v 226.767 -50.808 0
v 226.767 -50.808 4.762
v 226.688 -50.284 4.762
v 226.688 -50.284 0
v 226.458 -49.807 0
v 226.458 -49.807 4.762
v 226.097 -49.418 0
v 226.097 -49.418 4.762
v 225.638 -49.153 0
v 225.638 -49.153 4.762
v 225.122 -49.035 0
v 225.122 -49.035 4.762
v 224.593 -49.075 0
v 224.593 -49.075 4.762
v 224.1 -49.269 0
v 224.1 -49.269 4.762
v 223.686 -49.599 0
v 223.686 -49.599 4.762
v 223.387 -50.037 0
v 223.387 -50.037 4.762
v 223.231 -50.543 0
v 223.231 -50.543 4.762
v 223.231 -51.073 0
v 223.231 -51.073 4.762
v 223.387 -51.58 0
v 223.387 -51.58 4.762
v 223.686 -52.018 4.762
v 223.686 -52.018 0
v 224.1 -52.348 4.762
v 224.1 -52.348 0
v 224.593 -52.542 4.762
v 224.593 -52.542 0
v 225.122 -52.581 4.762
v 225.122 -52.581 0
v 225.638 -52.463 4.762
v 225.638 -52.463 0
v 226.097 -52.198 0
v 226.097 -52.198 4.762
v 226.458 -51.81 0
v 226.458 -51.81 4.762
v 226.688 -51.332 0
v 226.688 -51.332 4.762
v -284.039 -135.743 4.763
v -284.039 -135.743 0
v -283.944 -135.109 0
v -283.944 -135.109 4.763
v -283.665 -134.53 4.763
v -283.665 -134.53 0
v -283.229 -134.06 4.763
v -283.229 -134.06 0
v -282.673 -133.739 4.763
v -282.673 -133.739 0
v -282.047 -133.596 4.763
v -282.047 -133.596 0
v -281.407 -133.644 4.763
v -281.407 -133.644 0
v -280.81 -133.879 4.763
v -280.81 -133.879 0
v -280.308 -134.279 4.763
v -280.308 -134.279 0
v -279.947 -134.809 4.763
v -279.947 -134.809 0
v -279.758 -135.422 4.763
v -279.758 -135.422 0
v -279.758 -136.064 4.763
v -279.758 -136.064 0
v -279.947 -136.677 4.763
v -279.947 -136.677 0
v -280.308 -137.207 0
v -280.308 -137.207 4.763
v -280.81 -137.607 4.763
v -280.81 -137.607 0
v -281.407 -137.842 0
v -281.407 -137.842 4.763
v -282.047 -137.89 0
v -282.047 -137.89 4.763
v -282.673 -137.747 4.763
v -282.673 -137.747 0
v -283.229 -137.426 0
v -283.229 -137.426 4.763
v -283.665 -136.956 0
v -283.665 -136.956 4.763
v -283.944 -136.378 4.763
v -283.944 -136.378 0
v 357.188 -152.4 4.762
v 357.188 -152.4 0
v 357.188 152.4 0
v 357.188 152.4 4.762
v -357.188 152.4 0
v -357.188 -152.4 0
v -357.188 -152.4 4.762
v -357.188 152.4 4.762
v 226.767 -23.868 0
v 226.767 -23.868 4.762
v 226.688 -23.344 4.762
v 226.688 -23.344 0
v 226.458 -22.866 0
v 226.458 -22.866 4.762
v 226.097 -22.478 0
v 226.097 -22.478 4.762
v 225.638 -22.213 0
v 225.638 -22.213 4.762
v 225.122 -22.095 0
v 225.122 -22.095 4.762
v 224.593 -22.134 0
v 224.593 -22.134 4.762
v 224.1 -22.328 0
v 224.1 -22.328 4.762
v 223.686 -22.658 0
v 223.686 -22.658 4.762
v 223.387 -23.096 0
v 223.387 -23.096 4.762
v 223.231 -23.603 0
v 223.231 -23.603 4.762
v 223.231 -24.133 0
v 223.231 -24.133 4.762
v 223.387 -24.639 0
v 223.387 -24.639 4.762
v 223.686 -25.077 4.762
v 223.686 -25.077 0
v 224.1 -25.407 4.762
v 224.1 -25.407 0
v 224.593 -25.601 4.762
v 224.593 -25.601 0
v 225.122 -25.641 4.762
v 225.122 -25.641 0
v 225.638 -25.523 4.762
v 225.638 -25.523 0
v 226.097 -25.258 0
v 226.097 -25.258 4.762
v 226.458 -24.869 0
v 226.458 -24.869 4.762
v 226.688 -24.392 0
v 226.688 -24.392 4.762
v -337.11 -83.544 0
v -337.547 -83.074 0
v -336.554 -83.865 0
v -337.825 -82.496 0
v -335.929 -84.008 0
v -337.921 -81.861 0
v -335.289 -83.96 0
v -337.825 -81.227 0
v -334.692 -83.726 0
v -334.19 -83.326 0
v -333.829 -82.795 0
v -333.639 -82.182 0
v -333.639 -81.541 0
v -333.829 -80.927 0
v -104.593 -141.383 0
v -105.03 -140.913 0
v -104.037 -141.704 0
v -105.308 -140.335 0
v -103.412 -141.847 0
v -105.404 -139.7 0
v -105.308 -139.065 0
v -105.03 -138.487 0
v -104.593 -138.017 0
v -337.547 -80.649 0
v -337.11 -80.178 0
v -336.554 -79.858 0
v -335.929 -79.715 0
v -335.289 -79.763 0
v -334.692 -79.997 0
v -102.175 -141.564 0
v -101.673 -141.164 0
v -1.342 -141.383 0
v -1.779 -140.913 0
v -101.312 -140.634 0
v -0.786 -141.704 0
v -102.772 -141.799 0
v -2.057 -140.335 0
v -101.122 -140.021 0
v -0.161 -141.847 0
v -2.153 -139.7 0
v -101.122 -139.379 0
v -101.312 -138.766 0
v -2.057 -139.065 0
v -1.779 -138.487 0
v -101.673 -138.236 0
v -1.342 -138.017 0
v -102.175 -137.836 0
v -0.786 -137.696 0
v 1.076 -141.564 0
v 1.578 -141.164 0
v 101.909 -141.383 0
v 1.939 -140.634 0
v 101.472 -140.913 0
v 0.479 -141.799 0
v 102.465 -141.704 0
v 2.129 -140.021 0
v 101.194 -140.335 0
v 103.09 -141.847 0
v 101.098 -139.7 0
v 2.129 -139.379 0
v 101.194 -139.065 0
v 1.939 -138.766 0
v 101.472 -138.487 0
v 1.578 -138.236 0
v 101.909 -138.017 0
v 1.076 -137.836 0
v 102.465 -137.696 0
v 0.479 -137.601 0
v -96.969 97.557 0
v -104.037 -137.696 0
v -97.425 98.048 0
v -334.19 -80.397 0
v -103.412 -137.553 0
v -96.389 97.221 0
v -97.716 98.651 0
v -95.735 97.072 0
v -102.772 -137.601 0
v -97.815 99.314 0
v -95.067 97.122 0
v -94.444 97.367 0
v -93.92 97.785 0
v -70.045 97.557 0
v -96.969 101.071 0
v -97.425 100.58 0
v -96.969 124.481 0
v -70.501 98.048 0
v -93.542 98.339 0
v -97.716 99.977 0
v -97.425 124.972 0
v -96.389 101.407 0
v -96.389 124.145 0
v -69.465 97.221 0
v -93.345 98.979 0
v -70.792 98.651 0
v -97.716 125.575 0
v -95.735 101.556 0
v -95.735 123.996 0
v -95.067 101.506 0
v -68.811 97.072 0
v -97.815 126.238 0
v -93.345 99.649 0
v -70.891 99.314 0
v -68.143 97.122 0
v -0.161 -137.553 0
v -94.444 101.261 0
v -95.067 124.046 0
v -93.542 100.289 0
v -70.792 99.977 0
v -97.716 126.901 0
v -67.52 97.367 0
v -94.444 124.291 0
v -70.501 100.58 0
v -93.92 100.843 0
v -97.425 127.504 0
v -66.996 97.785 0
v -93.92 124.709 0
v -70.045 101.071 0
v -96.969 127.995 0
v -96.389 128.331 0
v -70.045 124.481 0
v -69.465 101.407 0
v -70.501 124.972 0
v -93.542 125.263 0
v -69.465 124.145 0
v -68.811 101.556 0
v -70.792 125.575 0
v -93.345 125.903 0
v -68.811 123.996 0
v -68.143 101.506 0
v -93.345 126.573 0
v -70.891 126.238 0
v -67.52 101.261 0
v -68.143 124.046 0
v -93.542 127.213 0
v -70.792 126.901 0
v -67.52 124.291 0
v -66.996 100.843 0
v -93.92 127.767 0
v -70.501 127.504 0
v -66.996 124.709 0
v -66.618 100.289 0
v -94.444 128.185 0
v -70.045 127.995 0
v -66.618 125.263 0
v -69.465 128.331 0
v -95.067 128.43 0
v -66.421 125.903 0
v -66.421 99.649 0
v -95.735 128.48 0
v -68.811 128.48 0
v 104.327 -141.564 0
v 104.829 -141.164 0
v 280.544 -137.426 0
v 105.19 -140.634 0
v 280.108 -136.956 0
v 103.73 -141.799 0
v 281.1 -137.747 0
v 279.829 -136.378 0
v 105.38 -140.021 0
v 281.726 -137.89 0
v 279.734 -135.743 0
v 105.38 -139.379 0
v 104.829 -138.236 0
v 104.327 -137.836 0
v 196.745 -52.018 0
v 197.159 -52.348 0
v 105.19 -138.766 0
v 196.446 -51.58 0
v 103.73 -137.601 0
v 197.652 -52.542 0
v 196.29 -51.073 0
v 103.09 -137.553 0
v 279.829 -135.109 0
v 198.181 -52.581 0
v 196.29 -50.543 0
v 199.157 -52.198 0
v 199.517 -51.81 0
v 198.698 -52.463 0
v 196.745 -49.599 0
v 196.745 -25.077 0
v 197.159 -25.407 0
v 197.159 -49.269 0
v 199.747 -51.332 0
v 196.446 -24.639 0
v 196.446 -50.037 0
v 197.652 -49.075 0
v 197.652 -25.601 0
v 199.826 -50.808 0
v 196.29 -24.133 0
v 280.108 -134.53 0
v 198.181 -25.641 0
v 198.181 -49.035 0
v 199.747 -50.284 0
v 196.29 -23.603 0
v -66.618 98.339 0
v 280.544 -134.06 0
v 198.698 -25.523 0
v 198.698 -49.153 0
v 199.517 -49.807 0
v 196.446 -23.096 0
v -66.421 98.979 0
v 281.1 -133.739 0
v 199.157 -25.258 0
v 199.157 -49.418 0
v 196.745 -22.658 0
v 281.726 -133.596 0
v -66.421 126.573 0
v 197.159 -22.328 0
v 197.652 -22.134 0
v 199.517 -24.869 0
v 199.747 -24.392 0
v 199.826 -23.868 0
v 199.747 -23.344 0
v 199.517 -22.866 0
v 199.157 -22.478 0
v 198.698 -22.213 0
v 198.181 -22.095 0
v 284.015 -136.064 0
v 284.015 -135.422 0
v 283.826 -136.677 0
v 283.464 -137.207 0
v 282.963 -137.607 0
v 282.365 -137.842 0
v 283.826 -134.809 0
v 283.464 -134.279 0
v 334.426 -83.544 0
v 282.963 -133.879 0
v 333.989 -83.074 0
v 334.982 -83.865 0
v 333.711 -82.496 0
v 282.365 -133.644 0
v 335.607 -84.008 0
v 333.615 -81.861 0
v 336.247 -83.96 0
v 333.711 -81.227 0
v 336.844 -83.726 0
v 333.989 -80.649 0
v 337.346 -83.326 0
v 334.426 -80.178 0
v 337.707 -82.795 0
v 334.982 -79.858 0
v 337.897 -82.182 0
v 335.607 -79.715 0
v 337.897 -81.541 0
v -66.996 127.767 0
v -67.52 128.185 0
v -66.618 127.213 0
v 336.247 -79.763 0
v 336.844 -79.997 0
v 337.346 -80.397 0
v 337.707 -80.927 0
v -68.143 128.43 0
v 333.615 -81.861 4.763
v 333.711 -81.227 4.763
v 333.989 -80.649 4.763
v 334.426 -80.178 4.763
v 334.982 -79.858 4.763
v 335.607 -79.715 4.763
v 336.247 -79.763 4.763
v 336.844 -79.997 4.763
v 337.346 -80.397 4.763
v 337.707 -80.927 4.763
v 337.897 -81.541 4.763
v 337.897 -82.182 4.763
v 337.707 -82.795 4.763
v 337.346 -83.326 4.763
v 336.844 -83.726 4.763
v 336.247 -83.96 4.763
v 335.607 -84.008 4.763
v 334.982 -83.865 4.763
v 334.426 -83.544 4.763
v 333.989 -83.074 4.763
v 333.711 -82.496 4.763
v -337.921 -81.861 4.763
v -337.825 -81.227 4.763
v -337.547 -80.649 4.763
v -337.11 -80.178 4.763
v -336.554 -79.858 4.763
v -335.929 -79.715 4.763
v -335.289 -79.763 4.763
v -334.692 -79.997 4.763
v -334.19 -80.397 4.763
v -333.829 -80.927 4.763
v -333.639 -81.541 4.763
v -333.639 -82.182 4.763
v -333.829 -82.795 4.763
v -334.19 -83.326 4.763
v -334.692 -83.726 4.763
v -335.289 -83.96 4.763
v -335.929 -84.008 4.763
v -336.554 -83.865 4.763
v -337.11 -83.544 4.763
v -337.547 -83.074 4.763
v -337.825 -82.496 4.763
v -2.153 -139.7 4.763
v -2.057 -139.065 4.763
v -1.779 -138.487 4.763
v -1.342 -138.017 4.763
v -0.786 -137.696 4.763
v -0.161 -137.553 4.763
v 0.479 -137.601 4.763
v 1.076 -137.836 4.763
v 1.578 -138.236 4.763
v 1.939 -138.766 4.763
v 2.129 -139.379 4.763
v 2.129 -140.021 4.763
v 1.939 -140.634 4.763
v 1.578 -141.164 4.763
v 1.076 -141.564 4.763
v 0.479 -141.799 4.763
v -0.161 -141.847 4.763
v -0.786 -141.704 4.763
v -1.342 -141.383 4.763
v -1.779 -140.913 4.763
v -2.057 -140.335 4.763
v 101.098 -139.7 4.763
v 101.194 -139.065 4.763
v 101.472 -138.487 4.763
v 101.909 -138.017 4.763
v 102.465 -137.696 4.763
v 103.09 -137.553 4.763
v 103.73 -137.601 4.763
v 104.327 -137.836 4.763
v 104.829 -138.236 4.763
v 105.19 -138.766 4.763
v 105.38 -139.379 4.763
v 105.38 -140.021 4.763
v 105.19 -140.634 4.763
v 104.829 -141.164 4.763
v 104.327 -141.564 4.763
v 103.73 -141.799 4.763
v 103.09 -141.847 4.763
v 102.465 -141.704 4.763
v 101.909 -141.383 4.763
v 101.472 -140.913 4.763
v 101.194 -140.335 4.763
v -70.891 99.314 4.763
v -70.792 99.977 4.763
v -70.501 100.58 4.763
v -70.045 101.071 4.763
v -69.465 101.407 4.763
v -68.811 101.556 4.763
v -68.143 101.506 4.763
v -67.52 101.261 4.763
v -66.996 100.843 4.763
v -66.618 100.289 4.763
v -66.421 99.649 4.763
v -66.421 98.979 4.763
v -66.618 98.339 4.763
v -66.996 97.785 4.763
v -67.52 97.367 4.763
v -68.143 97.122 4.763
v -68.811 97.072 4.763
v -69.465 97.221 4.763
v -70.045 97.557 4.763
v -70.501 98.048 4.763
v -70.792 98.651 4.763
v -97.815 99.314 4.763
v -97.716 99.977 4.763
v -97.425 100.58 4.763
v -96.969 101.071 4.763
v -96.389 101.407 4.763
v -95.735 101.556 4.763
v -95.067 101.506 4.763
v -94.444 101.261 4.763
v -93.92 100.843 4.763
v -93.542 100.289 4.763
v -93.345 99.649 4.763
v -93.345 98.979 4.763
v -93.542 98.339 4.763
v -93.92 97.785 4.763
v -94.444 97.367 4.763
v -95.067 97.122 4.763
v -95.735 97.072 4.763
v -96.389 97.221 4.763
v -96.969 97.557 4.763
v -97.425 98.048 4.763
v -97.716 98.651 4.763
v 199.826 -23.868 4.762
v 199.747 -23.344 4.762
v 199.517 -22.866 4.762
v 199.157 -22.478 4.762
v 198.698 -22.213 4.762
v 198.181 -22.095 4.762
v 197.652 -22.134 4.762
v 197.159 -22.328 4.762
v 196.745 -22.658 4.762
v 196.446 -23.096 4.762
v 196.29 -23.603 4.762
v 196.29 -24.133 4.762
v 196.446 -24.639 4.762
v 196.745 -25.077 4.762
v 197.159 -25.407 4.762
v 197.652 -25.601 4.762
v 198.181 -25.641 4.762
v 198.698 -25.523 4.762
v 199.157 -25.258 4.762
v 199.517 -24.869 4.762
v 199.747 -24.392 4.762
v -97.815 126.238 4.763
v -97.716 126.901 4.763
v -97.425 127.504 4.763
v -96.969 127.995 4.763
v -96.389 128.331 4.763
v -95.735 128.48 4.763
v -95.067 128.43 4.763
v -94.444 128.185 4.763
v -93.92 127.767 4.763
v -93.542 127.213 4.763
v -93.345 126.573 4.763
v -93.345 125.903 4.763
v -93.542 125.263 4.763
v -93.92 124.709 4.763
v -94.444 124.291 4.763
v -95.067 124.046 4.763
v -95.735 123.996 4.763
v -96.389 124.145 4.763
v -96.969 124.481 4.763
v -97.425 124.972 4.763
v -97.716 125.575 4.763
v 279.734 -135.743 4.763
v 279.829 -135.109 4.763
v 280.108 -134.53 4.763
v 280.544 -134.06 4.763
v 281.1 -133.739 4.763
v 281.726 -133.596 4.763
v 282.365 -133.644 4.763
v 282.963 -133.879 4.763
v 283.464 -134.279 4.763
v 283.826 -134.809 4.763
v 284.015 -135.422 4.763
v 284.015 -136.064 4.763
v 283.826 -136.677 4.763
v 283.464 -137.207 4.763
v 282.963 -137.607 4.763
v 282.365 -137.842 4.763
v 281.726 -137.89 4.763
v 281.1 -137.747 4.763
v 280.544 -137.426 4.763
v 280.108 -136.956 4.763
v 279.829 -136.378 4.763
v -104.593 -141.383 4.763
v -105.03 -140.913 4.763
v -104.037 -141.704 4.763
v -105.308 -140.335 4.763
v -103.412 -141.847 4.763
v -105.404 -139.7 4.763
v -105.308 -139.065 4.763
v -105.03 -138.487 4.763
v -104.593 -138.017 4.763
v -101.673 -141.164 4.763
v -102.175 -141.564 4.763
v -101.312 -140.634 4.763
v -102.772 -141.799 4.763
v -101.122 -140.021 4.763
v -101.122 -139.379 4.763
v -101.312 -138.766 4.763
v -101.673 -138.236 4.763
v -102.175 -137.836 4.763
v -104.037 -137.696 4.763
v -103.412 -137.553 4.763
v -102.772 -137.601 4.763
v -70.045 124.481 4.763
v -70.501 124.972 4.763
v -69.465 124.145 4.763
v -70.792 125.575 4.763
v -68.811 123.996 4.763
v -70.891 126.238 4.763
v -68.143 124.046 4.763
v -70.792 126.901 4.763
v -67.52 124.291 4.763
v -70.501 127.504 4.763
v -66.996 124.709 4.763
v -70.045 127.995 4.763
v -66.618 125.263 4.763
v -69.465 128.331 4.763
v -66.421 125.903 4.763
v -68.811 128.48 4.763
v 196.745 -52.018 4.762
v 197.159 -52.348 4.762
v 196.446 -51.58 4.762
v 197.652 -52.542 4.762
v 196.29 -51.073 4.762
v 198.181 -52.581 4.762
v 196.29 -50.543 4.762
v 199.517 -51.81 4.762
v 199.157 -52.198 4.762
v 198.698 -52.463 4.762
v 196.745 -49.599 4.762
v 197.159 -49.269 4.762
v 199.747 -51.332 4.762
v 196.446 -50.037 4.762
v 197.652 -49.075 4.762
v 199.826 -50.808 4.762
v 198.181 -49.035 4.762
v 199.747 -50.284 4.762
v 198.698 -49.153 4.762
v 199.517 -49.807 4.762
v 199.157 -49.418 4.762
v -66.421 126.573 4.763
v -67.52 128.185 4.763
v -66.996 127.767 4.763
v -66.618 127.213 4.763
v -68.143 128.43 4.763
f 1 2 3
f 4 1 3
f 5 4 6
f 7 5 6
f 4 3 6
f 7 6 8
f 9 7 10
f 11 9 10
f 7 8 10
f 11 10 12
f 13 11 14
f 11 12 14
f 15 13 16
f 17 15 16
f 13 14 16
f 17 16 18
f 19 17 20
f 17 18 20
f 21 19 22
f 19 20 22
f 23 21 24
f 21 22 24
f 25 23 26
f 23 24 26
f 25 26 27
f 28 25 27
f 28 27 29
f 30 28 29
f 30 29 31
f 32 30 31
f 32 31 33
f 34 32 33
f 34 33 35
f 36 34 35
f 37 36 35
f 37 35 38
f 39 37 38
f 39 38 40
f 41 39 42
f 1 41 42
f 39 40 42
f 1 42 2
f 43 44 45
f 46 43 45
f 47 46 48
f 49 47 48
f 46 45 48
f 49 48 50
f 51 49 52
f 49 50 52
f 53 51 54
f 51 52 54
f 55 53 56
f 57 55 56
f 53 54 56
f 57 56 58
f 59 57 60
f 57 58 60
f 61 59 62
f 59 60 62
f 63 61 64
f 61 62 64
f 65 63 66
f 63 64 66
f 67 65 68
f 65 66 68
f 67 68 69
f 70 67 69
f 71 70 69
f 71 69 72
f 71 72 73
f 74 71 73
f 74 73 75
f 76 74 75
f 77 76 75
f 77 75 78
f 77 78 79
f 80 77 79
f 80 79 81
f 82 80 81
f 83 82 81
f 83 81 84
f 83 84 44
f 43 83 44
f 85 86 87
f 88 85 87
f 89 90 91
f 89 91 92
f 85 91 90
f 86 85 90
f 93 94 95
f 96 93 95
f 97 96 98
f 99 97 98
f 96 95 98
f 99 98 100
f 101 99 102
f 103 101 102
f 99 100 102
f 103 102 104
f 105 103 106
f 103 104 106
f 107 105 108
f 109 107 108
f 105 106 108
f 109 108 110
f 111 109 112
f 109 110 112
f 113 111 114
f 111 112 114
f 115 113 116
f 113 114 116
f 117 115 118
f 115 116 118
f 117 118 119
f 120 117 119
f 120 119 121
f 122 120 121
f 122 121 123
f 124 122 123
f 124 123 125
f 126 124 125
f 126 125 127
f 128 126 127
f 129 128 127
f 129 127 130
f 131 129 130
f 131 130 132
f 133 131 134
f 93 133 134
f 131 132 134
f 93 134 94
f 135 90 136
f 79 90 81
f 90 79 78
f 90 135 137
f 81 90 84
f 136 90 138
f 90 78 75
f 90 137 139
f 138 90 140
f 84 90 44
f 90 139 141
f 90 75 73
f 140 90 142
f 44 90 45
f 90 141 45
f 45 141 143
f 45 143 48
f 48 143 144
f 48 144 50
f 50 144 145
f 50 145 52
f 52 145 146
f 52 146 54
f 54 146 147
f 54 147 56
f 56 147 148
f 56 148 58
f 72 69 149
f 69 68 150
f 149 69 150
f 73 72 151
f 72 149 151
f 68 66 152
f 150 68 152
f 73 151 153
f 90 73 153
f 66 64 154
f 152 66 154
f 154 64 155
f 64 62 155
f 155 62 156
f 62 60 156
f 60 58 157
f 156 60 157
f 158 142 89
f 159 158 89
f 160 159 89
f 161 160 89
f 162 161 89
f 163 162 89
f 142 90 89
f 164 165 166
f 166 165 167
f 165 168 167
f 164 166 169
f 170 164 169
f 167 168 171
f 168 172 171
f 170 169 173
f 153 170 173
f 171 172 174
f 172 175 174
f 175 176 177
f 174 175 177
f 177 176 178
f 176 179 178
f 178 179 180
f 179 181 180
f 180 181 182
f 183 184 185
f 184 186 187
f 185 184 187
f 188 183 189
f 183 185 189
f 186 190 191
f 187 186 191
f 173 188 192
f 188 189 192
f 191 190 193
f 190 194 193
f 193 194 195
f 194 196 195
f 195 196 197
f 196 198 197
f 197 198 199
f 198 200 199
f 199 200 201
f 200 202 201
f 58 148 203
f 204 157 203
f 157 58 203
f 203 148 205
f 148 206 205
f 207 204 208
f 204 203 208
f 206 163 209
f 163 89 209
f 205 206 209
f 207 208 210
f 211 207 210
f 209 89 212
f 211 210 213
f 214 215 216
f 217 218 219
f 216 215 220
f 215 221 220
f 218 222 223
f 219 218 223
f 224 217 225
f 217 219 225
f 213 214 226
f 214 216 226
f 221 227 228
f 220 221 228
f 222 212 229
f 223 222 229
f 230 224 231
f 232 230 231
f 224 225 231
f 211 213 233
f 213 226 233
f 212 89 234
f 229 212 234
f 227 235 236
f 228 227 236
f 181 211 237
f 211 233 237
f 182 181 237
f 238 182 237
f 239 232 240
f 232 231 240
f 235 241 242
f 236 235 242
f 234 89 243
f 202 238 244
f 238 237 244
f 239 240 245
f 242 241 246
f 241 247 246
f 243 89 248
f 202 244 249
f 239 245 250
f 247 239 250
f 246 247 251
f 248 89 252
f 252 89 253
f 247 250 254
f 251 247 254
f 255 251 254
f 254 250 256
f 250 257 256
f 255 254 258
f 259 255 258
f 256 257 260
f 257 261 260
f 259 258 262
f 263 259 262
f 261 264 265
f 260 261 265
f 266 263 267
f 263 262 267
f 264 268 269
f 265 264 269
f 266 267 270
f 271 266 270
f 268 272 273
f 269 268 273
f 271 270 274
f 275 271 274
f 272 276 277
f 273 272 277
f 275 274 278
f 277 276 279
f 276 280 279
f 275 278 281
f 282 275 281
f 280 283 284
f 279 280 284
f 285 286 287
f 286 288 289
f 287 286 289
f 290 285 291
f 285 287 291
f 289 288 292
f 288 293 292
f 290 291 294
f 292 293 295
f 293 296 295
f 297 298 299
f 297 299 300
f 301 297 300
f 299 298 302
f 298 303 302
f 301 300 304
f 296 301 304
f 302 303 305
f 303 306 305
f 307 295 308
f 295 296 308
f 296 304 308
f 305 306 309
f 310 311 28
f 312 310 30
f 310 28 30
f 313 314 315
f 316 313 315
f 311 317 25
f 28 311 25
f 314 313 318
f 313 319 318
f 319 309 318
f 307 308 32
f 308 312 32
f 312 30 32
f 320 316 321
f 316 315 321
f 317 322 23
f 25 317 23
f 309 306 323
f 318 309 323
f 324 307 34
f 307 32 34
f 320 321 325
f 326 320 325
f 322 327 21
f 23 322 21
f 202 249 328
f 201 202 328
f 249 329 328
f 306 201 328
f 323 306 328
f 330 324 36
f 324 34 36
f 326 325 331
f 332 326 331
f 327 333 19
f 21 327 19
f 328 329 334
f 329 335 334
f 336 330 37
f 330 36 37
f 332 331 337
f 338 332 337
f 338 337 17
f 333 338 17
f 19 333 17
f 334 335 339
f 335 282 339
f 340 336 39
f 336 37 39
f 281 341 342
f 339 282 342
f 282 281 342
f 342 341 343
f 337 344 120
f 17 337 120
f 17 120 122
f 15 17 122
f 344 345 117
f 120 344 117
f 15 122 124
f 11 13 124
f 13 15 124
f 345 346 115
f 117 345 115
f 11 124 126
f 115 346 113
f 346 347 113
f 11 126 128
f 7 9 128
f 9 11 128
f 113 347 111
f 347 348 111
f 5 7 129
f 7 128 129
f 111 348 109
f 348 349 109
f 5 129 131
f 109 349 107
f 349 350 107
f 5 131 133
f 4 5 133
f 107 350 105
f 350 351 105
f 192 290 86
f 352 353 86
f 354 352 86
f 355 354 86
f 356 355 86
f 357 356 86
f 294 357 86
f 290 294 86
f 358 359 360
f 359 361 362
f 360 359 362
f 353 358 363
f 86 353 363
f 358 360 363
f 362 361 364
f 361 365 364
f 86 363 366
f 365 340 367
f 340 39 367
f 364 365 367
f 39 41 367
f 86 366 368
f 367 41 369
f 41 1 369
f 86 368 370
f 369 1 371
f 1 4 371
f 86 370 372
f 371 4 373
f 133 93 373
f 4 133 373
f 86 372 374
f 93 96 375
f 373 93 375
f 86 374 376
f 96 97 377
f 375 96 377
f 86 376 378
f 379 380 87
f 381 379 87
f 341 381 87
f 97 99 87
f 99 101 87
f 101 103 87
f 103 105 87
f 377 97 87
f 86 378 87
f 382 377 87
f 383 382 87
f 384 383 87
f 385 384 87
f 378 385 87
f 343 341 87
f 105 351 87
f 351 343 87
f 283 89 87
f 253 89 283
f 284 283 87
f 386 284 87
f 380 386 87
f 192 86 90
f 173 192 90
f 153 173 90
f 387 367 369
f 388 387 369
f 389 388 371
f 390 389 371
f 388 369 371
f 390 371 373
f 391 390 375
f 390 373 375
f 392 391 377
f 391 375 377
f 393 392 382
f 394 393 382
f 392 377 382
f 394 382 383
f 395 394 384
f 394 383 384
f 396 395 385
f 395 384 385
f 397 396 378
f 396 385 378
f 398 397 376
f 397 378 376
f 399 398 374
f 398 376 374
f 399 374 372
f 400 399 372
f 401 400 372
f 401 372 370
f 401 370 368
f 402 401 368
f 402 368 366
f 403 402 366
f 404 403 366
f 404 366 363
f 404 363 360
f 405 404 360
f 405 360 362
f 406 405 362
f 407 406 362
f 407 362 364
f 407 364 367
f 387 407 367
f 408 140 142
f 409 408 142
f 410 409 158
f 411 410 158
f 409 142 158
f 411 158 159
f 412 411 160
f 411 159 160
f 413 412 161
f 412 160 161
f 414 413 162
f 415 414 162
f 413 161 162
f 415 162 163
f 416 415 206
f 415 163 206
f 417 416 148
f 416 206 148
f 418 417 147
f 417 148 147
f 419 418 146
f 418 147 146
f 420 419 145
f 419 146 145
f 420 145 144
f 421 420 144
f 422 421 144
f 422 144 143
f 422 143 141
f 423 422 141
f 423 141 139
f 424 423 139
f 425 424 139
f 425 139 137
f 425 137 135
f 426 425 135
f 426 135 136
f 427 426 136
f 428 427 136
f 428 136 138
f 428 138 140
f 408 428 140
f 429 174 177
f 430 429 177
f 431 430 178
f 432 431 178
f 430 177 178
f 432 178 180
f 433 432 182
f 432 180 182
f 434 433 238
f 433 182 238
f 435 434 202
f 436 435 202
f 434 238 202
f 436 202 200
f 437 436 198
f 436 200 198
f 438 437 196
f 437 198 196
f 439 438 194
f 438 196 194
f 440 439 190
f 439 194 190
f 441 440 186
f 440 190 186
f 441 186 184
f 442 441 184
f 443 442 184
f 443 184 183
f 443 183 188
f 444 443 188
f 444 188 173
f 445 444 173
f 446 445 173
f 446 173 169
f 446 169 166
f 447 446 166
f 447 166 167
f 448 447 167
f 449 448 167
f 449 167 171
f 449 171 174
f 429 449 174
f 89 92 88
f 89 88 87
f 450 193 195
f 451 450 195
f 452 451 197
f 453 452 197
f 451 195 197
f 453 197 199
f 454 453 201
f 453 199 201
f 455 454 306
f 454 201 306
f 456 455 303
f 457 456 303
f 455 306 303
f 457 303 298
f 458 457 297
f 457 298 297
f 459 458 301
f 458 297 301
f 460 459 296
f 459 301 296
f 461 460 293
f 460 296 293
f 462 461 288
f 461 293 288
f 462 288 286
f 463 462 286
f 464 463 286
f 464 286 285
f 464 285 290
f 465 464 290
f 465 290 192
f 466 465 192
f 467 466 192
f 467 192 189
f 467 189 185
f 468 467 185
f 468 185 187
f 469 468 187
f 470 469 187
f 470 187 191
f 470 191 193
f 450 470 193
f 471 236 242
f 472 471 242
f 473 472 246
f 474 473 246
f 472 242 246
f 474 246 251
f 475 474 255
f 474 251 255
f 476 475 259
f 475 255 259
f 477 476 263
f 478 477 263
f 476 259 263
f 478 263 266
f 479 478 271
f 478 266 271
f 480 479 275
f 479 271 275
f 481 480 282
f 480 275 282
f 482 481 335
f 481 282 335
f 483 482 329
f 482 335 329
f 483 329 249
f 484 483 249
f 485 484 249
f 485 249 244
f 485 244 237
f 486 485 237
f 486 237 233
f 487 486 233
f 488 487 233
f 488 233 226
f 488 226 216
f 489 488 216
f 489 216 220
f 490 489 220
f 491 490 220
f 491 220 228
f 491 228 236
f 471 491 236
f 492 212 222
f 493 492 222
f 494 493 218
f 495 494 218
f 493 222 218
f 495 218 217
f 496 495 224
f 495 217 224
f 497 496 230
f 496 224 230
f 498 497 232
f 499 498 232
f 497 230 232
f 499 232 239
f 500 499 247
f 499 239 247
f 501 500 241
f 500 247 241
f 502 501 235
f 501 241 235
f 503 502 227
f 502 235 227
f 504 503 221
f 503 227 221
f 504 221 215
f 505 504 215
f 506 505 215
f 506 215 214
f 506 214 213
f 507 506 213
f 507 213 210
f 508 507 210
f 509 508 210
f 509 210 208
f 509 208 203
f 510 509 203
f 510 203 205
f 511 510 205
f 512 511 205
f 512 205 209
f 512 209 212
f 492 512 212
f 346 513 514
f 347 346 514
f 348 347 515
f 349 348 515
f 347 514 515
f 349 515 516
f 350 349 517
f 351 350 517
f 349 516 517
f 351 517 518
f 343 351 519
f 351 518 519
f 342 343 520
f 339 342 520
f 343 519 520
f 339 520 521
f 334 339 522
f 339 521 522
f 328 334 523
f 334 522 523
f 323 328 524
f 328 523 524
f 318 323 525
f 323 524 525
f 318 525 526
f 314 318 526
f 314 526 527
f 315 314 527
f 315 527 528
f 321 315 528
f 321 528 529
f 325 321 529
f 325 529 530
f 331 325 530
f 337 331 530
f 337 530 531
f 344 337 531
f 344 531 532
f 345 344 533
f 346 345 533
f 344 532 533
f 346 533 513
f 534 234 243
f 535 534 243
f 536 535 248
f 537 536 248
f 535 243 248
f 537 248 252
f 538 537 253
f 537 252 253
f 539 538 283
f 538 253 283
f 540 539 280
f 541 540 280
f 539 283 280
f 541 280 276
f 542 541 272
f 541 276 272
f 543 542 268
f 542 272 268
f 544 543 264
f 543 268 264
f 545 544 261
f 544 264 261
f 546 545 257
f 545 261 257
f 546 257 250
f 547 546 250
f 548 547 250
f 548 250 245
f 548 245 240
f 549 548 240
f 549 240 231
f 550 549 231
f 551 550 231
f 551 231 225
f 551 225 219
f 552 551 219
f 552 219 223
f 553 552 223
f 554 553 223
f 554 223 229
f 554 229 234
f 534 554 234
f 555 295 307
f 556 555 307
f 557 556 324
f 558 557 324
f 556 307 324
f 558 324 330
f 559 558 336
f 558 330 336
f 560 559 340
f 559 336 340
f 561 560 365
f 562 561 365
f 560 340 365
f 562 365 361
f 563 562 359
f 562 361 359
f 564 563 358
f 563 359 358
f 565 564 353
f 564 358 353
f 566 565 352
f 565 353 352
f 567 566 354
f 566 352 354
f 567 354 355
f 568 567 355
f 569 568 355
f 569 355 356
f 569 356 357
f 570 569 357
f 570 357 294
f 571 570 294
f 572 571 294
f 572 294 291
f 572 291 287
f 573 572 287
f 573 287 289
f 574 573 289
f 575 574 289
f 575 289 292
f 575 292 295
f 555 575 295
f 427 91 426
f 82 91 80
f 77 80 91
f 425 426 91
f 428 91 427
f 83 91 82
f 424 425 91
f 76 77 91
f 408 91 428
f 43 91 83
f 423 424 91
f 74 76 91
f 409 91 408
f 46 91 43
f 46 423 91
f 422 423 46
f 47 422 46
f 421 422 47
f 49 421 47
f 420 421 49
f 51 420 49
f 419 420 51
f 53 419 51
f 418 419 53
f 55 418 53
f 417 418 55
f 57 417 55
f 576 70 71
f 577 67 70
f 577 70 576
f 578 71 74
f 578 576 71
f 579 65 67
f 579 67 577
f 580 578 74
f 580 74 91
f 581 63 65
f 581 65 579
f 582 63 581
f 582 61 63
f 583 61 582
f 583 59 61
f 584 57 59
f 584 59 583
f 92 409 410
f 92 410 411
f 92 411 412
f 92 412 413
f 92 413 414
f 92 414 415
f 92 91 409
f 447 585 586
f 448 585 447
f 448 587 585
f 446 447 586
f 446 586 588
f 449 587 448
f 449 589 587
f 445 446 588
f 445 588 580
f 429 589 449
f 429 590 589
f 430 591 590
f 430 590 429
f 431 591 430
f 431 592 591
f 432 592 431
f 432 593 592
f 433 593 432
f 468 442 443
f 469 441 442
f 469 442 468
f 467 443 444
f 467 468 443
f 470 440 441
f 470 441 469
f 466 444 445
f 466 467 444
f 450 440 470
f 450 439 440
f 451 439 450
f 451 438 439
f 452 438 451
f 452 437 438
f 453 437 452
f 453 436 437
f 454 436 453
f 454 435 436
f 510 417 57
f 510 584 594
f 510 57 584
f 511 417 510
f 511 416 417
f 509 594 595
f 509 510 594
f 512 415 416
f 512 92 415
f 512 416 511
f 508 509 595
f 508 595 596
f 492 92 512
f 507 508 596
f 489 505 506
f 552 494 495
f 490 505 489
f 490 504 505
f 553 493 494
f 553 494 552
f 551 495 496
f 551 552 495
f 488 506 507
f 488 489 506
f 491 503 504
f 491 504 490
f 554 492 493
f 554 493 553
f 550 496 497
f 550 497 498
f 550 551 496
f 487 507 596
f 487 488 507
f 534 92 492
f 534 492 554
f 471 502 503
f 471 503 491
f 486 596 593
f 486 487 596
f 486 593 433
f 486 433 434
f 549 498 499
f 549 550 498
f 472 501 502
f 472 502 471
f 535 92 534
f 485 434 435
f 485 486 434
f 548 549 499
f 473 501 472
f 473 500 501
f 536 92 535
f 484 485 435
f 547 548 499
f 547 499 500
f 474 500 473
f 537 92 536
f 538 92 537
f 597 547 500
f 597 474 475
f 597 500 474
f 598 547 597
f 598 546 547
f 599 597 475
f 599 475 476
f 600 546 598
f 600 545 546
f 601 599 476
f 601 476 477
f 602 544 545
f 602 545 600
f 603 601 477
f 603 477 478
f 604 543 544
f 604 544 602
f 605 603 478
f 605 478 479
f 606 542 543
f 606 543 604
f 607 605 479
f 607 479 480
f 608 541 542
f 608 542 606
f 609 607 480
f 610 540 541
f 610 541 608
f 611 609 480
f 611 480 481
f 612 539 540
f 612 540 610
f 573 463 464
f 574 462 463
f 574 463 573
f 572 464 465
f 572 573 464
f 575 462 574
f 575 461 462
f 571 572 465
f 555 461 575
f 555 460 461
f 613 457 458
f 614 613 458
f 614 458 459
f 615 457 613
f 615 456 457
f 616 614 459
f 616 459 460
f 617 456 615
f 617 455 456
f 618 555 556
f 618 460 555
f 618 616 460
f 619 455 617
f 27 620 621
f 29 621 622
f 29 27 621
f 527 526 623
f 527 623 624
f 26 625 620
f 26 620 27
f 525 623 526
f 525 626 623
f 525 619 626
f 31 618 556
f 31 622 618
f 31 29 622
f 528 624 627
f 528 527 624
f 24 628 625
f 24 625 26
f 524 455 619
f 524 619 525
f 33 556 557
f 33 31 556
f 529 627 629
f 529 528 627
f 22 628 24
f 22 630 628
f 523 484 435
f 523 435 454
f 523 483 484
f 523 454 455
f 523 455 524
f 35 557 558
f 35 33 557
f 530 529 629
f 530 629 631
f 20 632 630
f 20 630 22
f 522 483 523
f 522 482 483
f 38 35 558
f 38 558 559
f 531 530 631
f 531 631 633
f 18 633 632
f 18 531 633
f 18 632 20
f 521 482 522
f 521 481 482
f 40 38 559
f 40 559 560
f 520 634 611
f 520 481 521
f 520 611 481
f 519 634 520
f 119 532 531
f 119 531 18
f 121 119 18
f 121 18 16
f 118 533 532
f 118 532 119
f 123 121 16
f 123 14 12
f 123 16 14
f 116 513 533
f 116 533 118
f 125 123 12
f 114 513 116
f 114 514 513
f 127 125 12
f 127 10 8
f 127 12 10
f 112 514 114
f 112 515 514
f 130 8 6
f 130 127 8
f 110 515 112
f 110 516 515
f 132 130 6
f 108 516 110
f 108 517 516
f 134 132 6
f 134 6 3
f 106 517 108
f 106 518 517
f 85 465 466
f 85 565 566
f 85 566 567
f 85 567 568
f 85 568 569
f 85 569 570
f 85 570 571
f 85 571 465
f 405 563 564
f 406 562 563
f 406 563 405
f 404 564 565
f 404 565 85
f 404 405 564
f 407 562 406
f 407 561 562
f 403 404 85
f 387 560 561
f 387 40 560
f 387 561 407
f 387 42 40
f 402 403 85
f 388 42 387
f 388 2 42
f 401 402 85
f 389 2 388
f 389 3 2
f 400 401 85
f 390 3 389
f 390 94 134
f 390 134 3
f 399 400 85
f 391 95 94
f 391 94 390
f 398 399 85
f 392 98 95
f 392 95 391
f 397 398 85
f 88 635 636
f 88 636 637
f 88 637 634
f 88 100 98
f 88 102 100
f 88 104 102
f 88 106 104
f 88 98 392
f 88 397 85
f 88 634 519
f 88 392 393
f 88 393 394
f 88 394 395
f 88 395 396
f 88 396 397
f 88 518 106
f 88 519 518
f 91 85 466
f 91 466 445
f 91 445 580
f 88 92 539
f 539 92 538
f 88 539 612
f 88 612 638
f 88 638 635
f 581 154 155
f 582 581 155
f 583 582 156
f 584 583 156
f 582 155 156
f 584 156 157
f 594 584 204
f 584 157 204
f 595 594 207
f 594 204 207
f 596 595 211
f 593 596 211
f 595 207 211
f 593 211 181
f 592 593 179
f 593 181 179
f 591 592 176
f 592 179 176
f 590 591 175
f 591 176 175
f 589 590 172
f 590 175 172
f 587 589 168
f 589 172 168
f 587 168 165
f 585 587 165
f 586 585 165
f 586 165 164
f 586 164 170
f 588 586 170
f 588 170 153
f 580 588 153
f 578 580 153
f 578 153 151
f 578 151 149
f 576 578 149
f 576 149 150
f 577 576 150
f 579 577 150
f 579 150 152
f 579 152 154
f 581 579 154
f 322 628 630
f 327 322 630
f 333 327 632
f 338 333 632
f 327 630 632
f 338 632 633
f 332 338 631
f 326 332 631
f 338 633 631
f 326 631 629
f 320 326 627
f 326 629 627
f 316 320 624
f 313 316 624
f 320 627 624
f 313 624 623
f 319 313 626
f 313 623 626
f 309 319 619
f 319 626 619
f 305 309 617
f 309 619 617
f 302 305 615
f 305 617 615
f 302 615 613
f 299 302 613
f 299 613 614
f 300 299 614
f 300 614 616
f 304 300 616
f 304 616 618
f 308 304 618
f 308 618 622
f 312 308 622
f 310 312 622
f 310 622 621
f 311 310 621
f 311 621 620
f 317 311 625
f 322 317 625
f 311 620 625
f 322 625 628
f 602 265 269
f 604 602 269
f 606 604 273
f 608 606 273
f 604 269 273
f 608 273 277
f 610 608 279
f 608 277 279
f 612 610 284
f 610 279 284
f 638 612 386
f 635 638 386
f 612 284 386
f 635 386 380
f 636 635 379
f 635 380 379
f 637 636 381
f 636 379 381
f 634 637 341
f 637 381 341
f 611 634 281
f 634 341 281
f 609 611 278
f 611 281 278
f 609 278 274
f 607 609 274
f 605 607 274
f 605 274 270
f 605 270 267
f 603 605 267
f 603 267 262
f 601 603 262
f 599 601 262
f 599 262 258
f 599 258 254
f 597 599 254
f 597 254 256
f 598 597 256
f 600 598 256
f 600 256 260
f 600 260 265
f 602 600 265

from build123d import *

# Parameters (mm, degrees)
SKETCH1_W                 = 714.375
SKETCH1_H                 = 304.8
BOSS_EXTRUDE1_DEPTH       = 4.7625
CUT_EXTRUDE3_DEPTH        = 5.7625
CUT_EXTRUDE4_REACH        = 6.763
SKETCH5_R                 = 2.15265
BOSS_EXTRUDE2_START       = -638.8354
SKETCH7_W                 = 4.7625
SKETCH7_H                 = 304.8
BOSS_EXTRUDE2_DEPTH       = 563.2958
F_8_CLEARANCE_HOLE1_D     = 4.3053
F_8_CLEARANCE_HOLE1_DEPTH = 74.422
F_8_CLEARANCE_HOLE1_TIP   = 1.293442612
F_8_CLEARANCE_HOLE2_D     = 4.3053
F_8_CLEARANCE_HOLE2_DEPTH = 74.422
F_8_CLEARANCE_HOLE2_TIP   = 1.293442612
F_8_CLEARANCE_HOLE3_D     = 4.4958
F_8_CLEARANCE_HOLE3_DEPTH = 74.422
F_8_CLEARANCE_HOLE3_TIP   = 1.350674586
SKETCH16_R                = 1.778
CUT_EXTRUDE5_DEPTH        = 4.7625


with BuildPart() as part:
    # Sketch1 → Boss-Extrude1 (new body)
    with BuildSketch(Plane.XY):
        Rectangle(SKETCH1_W, SKETCH1_H)
    extrude(amount=BOSS_EXTRUDE1_DEPTH)

    # Sketch4 → Cut-Extrude3 (cut, through all)
    with BuildSketch(Plane.XY.offset(4.7625)):
        with BuildLine():
            Line((277.1521, 103.505), (277.1521, 112.395))
            ThreePointArc((277.1521, 112.395), (279.4, 114.6429), (281.6479, 112.395))
            Line((281.6479, 112.395), (281.6479, 103.505))
            ThreePointArc((281.6479, 103.505), (279.4, 101.2571), (277.1521, 103.505))
        make_face()
        with BuildLine():
            Line((-277.1521, 103.505), (-277.1521, 112.395))
            ThreePointArc((-277.1521, 112.395), (-279.4, 114.6429), (-281.6479, 112.395))
            Line((-281.6479, 112.395), (-281.6479, 103.505))
            ThreePointArc((-281.6479, 103.505), (-279.4, 101.2571), (-277.1521, 103.505))
        make_face()
    extrude(amount=-CUT_EXTRUDE3_DEPTH, mode=Mode.SUBTRACT)

    # Sketch5 → Cut-Extrude4 (cut, up to next)
    with BuildSketch(Plane.XY.offset(4.7625), mode=Mode.PRIVATE) as cut_extrude4_sk1:
        with Locations((-127, -120.65)):
            Circle(SKETCH5_R)
    cut_extrude4_tool1 = extrude(cut_extrude4_sk1.sketch, amount=-CUT_EXTRUDE4_REACH, mode=Mode.PRIVATE) & part.part
    add(cut_extrude4_tool1.solids().sort_by_distance((-127, -120.65, 4.7625))[0], mode=Mode.SUBTRACT)
    # Sketch5 → Cut-Extrude4 (cut, up to next)
    with BuildSketch(Plane.XY.offset(4.7625), mode=Mode.PRIVATE) as cut_extrude4_sk2:
        with Locations((-215.9, -120.65)):
            Circle(SKETCH5_R)
    cut_extrude4_tool2 = extrude(cut_extrude4_sk2.sketch, amount=-CUT_EXTRUDE4_REACH, mode=Mode.PRIVATE) & part.part
    add(cut_extrude4_tool2.solids().sort_by_distance((-215.9, -120.65, 4.7625))[0], mode=Mode.SUBTRACT)
    # Sketch5 → Cut-Extrude4 (cut, up to next)
    with BuildSketch(Plane.XY.offset(4.7625), mode=Mode.PRIVATE) as cut_extrude4_sk3:
        with Locations((215.9, -120.65)):
            Circle(SKETCH5_R)
    cut_extrude4_tool3 = extrude(cut_extrude4_sk3.sketch, amount=-CUT_EXTRUDE4_REACH, mode=Mode.PRIVATE) & part.part
    add(cut_extrude4_tool3.solids().sort_by_distance((215.9, -120.65, 4.7625))[0], mode=Mode.SUBTRACT)
    # Sketch5 → Cut-Extrude4 (cut, up to next)
    with BuildSketch(Plane.XY.offset(4.7625), mode=Mode.PRIVATE) as cut_extrude4_sk4:
        with Locations((127, -120.65)):
            Circle(SKETCH5_R)
    cut_extrude4_tool4 = extrude(cut_extrude4_sk4.sketch, amount=-CUT_EXTRUDE4_REACH, mode=Mode.PRIVATE) & part.part
    add(cut_extrude4_tool4.solids().sort_by_distance((127, -120.65, 4.7625))[0], mode=Mode.SUBTRACT)

    # Sketch7 → Boss-Extrude2 (add)
    with BuildSketch(Plane(origin=(357.1875, 0, 0), x_dir=(0, 0, -1), z_dir=(1, 0, 0)).offset(BOSS_EXTRUDE2_START)):
        with Locations((-2.38125, 0)):
            Rectangle(SKETCH7_W, SKETCH7_H)
    extrude(amount=BOSS_EXTRUDE2_DEPTH)

    # #8 Clearance Hole1
    with Locations(Plane.XY.offset(4.7625)):
        with Locations((-335.768024484, -81.861487758), (-281.886487758, -135.743024484), (281.886487758, -135.743024484), (335.768024484, -81.861487758)):
            Hole(F_8_CLEARANCE_HOLE1_D / 2, depth=F_8_CLEARANCE_HOLE1_DEPTH)
            with Locations((0, 0, -(F_8_CLEARANCE_HOLE1_DEPTH + F_8_CLEARANCE_HOLE1_TIP / 2))):  # 118° drill point
                Cone(0, F_8_CLEARANCE_HOLE1_D / 2, F_8_CLEARANCE_HOLE1_TIP, mode=Mode.SUBTRACT)

    # #8 Clearance Hole2
    with Locations(Plane.XY.offset(4.7625)):
        with Locations((-103.251, -139.7), (0, -139.7), (103.251, -139.7)):
            Hole(F_8_CLEARANCE_HOLE2_D / 2, depth=F_8_CLEARANCE_HOLE2_DEPTH)
            with Locations((0, 0, -(F_8_CLEARANCE_HOLE2_DEPTH + F_8_CLEARANCE_HOLE2_TIP / 2))):  # 118° drill point
                Cone(0, F_8_CLEARANCE_HOLE2_D / 2, F_8_CLEARANCE_HOLE2_TIP, mode=Mode.SUBTRACT)

    # #8 Clearance Hole3
    with Locations(Plane.XY.offset(4.7625)):
        with Locations((-95.5675, 126.238), (-68.6435, 126.238), (-95.5675, 99.314), (-68.6435, 99.314)):
            Hole(F_8_CLEARANCE_HOLE3_D / 2, depth=F_8_CLEARANCE_HOLE3_DEPTH)
            with Locations((0, 0, -(F_8_CLEARANCE_HOLE3_DEPTH + F_8_CLEARANCE_HOLE3_TIP / 2))):  # 118° drill point
                Cone(0, F_8_CLEARANCE_HOLE3_D / 2, F_8_CLEARANCE_HOLE3_TIP, mode=Mode.SUBTRACT)

    # Sketch16 → Cut-Extrude5 (cut)
    with BuildSketch(Plane.XY.offset(4.7625)):
        with Locations((198.048115818, -23.867615818)):
            Circle(SKETCH16_R)
        with Locations((224.988884182, -23.867615818)):
            Circle(SKETCH16_R)
        with Locations((224.988884182, -50.808384182)):
            Circle(SKETCH16_R)
        with Locations((198.048115818, -50.808384182)):
            Circle(SKETCH16_R)
    extrude(amount=-CUT_EXTRUDE5_DEPTH, mode=Mode.SUBTRACT)


solid = part.part
